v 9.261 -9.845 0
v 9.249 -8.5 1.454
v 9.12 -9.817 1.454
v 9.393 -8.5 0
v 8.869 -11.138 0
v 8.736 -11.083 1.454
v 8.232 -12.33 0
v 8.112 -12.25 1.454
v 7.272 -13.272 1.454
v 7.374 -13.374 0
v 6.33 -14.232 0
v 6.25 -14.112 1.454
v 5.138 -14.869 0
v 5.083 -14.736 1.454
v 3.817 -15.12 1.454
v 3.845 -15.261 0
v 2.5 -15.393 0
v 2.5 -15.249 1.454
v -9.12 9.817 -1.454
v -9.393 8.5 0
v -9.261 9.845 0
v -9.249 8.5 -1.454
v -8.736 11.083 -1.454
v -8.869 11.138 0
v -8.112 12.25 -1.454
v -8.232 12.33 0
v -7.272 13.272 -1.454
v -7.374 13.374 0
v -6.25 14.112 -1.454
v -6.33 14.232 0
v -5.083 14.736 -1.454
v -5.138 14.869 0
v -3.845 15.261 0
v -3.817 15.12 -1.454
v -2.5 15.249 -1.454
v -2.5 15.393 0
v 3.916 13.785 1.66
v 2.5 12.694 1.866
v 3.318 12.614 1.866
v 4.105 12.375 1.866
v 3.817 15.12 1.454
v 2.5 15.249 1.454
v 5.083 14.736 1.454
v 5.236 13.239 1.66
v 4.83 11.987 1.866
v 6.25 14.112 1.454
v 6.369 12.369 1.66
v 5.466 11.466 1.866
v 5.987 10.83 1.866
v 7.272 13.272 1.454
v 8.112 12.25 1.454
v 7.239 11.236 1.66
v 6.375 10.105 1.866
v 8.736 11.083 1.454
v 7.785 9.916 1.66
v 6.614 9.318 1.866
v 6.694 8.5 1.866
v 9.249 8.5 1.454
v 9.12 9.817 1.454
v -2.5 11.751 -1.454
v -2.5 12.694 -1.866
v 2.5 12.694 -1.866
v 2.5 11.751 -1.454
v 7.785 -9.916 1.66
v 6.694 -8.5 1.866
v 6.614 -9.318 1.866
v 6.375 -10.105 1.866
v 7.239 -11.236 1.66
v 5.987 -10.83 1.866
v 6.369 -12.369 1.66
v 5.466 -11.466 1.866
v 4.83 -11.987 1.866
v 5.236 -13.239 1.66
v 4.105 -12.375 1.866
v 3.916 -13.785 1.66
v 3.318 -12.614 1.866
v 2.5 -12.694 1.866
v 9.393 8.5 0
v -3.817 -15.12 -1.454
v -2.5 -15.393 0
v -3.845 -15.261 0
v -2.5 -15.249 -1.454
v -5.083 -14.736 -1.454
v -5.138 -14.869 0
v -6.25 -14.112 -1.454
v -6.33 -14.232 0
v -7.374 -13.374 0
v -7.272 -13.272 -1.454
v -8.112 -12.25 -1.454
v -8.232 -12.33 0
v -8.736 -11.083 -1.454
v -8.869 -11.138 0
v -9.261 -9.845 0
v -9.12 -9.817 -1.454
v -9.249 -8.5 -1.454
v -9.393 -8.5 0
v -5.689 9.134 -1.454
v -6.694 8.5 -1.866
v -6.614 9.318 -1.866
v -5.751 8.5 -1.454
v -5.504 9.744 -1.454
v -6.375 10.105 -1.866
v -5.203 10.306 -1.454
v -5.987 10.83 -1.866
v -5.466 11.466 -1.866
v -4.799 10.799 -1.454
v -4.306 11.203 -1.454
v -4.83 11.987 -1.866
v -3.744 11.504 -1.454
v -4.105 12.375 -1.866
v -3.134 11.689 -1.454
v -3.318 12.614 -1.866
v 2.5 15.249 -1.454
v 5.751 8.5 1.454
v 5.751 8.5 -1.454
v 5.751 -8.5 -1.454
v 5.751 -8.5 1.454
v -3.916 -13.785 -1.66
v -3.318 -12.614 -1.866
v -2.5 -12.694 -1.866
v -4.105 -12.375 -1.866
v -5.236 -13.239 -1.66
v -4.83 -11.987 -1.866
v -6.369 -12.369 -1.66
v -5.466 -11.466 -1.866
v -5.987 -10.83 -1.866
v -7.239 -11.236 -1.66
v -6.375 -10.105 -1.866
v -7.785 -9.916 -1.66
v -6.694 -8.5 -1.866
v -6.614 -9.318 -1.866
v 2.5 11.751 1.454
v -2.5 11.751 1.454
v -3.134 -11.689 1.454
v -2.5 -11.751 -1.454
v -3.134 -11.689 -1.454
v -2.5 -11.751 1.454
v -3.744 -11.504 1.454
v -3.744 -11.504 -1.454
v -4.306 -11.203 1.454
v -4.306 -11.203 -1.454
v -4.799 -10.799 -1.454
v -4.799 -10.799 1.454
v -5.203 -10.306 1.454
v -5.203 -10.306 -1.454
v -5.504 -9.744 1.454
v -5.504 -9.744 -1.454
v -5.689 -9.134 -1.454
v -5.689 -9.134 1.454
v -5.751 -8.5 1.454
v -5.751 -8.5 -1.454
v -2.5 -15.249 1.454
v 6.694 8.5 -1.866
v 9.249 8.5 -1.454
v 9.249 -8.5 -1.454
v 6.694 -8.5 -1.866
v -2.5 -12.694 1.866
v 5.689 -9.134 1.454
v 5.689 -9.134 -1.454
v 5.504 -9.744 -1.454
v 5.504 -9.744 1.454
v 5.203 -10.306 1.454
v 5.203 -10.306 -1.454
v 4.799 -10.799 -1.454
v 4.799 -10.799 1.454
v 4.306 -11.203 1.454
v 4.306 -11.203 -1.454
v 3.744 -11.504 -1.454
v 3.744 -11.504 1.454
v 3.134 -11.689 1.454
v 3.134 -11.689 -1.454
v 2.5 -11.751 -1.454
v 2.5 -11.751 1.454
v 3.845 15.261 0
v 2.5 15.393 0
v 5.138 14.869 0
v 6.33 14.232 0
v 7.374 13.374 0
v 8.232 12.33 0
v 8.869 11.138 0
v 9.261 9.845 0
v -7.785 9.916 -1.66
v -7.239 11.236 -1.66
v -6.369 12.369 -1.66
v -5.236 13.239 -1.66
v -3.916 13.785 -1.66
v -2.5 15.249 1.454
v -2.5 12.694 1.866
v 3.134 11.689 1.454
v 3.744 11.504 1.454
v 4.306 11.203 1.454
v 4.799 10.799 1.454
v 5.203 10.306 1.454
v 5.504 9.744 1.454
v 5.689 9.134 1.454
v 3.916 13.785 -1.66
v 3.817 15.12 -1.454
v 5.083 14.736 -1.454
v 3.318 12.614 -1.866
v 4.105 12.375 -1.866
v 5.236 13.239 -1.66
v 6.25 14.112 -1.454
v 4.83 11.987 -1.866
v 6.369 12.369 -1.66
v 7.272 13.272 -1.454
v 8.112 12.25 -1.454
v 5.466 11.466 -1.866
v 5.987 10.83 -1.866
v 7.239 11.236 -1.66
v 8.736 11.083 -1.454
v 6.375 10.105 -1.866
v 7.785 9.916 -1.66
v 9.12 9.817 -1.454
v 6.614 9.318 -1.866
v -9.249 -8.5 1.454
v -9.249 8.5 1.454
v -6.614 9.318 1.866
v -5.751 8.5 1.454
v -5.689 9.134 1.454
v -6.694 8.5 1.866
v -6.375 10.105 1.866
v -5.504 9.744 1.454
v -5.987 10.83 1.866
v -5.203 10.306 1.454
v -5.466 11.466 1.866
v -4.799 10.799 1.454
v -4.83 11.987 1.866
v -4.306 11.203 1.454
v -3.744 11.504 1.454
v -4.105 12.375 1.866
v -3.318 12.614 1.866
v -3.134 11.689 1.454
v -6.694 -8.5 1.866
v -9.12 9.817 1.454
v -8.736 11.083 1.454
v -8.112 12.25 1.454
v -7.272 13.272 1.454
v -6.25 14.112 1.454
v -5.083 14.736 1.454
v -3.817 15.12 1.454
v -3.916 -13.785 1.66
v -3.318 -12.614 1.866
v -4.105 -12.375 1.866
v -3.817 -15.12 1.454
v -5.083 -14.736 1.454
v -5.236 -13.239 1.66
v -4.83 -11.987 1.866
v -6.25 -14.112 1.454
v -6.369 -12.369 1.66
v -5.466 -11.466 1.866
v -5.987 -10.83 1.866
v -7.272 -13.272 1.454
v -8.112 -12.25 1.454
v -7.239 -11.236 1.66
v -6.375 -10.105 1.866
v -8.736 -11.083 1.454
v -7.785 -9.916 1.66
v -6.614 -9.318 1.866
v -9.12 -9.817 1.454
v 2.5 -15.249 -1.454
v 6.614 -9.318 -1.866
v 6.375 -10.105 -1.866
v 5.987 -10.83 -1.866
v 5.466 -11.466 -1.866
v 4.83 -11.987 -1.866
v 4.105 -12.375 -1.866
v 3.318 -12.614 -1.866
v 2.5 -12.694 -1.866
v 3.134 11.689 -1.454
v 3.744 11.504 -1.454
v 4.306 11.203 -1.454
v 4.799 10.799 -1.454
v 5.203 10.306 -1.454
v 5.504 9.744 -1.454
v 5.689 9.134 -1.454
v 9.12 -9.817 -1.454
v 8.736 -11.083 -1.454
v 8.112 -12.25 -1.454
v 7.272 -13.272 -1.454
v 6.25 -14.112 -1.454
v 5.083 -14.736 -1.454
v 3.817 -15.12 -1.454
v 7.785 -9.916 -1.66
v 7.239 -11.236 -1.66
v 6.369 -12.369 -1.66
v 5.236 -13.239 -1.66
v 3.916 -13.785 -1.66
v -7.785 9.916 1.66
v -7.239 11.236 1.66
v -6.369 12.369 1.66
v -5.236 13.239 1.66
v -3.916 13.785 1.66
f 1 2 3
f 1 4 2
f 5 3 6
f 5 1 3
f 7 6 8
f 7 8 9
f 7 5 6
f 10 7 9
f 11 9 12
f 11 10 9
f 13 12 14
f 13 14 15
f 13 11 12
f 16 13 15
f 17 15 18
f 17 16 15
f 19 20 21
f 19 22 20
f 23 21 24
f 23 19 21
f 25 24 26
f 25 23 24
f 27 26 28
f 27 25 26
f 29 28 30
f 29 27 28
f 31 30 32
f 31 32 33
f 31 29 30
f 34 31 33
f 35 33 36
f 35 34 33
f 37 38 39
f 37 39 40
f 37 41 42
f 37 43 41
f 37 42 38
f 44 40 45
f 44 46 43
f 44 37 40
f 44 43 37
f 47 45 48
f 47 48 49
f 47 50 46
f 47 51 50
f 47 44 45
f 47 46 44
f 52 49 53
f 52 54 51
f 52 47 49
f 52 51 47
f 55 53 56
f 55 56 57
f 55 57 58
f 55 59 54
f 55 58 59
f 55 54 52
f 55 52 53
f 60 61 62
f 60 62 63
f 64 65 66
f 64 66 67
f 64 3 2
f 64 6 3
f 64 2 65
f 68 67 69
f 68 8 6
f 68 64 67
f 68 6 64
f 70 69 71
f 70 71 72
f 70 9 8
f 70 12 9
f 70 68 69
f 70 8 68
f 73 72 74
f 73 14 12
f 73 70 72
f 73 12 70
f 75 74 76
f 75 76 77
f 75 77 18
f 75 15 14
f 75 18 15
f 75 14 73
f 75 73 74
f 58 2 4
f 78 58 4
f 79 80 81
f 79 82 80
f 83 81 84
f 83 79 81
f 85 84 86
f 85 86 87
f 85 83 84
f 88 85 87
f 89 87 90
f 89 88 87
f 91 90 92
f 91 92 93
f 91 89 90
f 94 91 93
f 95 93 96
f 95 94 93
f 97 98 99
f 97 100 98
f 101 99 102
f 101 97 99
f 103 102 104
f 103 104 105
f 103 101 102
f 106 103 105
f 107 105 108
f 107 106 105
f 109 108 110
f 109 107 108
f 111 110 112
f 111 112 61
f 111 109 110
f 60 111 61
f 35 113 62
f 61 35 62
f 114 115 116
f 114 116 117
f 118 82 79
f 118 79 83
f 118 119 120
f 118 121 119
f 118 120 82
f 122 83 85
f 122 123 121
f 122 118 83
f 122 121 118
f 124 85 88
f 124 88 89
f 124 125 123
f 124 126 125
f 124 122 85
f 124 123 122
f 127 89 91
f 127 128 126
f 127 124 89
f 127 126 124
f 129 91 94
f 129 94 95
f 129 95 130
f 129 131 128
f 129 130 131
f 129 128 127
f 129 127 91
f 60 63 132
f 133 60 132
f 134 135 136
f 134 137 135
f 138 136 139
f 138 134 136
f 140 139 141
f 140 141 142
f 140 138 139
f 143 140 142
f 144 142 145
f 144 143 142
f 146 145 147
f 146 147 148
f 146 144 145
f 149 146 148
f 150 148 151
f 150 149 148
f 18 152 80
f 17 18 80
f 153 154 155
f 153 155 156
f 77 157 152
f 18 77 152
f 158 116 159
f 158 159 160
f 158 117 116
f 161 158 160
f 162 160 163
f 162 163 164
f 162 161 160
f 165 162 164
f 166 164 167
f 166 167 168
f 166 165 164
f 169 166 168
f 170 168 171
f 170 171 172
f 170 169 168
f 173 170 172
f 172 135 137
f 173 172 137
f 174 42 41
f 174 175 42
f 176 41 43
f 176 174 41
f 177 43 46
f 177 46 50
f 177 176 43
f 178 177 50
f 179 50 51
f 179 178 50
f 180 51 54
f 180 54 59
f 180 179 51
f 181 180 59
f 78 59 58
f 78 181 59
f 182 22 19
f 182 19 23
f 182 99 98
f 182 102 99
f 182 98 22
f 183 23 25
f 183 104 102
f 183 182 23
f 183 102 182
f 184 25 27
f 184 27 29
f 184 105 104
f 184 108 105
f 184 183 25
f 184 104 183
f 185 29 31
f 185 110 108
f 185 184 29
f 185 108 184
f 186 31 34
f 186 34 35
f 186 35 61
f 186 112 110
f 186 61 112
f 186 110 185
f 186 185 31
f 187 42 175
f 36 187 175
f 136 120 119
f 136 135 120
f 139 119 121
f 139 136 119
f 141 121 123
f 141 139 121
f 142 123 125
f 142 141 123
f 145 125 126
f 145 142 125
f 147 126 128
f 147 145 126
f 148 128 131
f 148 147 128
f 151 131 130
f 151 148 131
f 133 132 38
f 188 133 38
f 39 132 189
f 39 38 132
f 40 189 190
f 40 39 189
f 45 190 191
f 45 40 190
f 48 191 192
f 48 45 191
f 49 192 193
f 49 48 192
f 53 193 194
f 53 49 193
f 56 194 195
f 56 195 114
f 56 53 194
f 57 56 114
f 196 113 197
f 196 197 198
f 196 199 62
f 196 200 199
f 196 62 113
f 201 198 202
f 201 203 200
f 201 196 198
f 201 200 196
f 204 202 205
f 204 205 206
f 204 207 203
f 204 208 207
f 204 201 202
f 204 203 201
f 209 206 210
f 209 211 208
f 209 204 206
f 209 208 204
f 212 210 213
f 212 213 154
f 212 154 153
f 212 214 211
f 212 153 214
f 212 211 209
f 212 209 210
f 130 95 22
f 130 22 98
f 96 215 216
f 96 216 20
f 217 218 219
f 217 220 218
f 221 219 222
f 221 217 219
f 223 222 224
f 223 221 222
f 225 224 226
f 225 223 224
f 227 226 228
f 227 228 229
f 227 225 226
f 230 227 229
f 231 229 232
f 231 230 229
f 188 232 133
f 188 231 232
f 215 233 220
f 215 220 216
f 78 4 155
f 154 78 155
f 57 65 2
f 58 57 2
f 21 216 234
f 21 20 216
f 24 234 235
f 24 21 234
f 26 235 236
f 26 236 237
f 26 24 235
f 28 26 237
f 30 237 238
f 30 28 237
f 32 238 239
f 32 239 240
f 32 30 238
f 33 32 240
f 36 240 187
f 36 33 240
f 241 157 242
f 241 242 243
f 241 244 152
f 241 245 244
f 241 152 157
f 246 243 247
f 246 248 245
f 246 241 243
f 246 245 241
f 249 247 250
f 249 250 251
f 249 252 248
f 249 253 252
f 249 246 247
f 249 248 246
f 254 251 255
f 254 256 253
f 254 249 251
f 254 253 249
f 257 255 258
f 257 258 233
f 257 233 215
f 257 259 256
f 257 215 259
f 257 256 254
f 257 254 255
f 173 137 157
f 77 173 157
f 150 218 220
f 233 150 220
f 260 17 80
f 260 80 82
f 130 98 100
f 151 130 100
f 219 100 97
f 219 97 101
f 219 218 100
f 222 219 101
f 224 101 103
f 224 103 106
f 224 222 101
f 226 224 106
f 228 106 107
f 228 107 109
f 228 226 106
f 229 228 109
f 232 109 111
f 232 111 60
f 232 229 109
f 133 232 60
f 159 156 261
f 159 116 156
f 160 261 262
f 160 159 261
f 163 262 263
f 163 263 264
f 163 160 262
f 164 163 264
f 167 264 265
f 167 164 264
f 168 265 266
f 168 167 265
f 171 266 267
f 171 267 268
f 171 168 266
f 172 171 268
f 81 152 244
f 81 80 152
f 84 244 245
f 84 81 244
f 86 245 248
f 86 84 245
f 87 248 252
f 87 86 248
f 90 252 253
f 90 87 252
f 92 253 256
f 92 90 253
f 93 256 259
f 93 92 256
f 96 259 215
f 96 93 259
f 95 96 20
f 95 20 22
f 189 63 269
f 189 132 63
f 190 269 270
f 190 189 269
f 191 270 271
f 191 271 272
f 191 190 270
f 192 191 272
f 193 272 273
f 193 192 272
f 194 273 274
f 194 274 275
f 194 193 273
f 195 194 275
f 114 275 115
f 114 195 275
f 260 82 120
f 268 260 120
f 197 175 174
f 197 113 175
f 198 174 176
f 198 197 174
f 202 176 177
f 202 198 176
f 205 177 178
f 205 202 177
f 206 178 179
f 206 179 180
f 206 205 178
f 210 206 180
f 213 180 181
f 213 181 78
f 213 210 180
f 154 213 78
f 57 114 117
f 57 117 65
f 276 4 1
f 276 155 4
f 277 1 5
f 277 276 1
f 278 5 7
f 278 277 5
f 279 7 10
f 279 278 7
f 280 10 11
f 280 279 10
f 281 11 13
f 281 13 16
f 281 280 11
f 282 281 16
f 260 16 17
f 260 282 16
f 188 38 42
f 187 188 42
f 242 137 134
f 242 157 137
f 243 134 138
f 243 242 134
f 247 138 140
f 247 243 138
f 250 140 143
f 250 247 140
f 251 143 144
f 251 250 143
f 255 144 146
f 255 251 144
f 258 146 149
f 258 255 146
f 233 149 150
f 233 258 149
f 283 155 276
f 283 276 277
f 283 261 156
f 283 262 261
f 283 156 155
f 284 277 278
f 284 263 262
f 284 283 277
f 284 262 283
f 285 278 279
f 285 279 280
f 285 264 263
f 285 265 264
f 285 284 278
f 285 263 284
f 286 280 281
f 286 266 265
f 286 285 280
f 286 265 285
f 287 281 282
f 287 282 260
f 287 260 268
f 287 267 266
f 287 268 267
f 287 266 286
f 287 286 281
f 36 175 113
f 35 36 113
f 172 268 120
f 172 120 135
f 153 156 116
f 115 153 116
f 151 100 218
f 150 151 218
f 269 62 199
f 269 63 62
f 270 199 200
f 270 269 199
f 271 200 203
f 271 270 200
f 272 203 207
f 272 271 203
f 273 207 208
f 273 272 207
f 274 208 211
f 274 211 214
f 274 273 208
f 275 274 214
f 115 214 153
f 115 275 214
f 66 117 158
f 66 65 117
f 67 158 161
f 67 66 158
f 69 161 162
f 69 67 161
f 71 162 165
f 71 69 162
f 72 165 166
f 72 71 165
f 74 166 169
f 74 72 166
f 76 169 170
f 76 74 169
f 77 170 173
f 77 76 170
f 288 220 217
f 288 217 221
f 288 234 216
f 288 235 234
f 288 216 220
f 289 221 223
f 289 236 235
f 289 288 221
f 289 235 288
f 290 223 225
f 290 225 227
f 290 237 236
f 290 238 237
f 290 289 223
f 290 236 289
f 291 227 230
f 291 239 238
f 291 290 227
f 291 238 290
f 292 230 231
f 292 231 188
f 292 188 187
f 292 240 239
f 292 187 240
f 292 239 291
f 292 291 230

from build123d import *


# Not quite as in the source:
# - a feature names something its author has since deleted; it is built from what else it names


with BuildPart() as f2:
    # F2: sweep along a path in F0
    with BuildLine(Plane.XY) as f2_path:
        Line((-7.5, -8.5), (-7.5, 8.5))
        ThreePointArc((-7.5, 8.5), (-6.0355339059, 12.0355339059), (-2.5, 13.5))
        Line((-2.5, 13.5), (2.5, 13.5))
        ThreePointArc((2.5, 13.5), (6.0355339059, 12.0355339059), (7.5, 8.5))
        Line((7.5, 8.5), (7.5, -8.5))
        ThreePointArc((7.5, -8.5), (6.0355339059, -12.0355339059), (2.5, -13.5))
        Line((2.5, -13.5), (-2.5, -13.5))
        ThreePointArc((-2.5, -13.5), (-6.0355339059, -12.0355339059), (-7.5, -8.5))
    # F1 (on Front) → F2 (sweep)
    with BuildSketch(Plane.XZ):
        Polygon((-5.751425866, 1.454347861), (-6.6942584633, 1.8659339551), (-9.2492606491, 1.454347861), (-9.3934396282, 0), (-9.2492606491, -1.454347861), (-6.6942584633, -1.8659339551), (-5.751425866, -1.454347861), (-5.751425866, 0), align=None)
    sweep(path=f2_path.line)


solid = f2.part
